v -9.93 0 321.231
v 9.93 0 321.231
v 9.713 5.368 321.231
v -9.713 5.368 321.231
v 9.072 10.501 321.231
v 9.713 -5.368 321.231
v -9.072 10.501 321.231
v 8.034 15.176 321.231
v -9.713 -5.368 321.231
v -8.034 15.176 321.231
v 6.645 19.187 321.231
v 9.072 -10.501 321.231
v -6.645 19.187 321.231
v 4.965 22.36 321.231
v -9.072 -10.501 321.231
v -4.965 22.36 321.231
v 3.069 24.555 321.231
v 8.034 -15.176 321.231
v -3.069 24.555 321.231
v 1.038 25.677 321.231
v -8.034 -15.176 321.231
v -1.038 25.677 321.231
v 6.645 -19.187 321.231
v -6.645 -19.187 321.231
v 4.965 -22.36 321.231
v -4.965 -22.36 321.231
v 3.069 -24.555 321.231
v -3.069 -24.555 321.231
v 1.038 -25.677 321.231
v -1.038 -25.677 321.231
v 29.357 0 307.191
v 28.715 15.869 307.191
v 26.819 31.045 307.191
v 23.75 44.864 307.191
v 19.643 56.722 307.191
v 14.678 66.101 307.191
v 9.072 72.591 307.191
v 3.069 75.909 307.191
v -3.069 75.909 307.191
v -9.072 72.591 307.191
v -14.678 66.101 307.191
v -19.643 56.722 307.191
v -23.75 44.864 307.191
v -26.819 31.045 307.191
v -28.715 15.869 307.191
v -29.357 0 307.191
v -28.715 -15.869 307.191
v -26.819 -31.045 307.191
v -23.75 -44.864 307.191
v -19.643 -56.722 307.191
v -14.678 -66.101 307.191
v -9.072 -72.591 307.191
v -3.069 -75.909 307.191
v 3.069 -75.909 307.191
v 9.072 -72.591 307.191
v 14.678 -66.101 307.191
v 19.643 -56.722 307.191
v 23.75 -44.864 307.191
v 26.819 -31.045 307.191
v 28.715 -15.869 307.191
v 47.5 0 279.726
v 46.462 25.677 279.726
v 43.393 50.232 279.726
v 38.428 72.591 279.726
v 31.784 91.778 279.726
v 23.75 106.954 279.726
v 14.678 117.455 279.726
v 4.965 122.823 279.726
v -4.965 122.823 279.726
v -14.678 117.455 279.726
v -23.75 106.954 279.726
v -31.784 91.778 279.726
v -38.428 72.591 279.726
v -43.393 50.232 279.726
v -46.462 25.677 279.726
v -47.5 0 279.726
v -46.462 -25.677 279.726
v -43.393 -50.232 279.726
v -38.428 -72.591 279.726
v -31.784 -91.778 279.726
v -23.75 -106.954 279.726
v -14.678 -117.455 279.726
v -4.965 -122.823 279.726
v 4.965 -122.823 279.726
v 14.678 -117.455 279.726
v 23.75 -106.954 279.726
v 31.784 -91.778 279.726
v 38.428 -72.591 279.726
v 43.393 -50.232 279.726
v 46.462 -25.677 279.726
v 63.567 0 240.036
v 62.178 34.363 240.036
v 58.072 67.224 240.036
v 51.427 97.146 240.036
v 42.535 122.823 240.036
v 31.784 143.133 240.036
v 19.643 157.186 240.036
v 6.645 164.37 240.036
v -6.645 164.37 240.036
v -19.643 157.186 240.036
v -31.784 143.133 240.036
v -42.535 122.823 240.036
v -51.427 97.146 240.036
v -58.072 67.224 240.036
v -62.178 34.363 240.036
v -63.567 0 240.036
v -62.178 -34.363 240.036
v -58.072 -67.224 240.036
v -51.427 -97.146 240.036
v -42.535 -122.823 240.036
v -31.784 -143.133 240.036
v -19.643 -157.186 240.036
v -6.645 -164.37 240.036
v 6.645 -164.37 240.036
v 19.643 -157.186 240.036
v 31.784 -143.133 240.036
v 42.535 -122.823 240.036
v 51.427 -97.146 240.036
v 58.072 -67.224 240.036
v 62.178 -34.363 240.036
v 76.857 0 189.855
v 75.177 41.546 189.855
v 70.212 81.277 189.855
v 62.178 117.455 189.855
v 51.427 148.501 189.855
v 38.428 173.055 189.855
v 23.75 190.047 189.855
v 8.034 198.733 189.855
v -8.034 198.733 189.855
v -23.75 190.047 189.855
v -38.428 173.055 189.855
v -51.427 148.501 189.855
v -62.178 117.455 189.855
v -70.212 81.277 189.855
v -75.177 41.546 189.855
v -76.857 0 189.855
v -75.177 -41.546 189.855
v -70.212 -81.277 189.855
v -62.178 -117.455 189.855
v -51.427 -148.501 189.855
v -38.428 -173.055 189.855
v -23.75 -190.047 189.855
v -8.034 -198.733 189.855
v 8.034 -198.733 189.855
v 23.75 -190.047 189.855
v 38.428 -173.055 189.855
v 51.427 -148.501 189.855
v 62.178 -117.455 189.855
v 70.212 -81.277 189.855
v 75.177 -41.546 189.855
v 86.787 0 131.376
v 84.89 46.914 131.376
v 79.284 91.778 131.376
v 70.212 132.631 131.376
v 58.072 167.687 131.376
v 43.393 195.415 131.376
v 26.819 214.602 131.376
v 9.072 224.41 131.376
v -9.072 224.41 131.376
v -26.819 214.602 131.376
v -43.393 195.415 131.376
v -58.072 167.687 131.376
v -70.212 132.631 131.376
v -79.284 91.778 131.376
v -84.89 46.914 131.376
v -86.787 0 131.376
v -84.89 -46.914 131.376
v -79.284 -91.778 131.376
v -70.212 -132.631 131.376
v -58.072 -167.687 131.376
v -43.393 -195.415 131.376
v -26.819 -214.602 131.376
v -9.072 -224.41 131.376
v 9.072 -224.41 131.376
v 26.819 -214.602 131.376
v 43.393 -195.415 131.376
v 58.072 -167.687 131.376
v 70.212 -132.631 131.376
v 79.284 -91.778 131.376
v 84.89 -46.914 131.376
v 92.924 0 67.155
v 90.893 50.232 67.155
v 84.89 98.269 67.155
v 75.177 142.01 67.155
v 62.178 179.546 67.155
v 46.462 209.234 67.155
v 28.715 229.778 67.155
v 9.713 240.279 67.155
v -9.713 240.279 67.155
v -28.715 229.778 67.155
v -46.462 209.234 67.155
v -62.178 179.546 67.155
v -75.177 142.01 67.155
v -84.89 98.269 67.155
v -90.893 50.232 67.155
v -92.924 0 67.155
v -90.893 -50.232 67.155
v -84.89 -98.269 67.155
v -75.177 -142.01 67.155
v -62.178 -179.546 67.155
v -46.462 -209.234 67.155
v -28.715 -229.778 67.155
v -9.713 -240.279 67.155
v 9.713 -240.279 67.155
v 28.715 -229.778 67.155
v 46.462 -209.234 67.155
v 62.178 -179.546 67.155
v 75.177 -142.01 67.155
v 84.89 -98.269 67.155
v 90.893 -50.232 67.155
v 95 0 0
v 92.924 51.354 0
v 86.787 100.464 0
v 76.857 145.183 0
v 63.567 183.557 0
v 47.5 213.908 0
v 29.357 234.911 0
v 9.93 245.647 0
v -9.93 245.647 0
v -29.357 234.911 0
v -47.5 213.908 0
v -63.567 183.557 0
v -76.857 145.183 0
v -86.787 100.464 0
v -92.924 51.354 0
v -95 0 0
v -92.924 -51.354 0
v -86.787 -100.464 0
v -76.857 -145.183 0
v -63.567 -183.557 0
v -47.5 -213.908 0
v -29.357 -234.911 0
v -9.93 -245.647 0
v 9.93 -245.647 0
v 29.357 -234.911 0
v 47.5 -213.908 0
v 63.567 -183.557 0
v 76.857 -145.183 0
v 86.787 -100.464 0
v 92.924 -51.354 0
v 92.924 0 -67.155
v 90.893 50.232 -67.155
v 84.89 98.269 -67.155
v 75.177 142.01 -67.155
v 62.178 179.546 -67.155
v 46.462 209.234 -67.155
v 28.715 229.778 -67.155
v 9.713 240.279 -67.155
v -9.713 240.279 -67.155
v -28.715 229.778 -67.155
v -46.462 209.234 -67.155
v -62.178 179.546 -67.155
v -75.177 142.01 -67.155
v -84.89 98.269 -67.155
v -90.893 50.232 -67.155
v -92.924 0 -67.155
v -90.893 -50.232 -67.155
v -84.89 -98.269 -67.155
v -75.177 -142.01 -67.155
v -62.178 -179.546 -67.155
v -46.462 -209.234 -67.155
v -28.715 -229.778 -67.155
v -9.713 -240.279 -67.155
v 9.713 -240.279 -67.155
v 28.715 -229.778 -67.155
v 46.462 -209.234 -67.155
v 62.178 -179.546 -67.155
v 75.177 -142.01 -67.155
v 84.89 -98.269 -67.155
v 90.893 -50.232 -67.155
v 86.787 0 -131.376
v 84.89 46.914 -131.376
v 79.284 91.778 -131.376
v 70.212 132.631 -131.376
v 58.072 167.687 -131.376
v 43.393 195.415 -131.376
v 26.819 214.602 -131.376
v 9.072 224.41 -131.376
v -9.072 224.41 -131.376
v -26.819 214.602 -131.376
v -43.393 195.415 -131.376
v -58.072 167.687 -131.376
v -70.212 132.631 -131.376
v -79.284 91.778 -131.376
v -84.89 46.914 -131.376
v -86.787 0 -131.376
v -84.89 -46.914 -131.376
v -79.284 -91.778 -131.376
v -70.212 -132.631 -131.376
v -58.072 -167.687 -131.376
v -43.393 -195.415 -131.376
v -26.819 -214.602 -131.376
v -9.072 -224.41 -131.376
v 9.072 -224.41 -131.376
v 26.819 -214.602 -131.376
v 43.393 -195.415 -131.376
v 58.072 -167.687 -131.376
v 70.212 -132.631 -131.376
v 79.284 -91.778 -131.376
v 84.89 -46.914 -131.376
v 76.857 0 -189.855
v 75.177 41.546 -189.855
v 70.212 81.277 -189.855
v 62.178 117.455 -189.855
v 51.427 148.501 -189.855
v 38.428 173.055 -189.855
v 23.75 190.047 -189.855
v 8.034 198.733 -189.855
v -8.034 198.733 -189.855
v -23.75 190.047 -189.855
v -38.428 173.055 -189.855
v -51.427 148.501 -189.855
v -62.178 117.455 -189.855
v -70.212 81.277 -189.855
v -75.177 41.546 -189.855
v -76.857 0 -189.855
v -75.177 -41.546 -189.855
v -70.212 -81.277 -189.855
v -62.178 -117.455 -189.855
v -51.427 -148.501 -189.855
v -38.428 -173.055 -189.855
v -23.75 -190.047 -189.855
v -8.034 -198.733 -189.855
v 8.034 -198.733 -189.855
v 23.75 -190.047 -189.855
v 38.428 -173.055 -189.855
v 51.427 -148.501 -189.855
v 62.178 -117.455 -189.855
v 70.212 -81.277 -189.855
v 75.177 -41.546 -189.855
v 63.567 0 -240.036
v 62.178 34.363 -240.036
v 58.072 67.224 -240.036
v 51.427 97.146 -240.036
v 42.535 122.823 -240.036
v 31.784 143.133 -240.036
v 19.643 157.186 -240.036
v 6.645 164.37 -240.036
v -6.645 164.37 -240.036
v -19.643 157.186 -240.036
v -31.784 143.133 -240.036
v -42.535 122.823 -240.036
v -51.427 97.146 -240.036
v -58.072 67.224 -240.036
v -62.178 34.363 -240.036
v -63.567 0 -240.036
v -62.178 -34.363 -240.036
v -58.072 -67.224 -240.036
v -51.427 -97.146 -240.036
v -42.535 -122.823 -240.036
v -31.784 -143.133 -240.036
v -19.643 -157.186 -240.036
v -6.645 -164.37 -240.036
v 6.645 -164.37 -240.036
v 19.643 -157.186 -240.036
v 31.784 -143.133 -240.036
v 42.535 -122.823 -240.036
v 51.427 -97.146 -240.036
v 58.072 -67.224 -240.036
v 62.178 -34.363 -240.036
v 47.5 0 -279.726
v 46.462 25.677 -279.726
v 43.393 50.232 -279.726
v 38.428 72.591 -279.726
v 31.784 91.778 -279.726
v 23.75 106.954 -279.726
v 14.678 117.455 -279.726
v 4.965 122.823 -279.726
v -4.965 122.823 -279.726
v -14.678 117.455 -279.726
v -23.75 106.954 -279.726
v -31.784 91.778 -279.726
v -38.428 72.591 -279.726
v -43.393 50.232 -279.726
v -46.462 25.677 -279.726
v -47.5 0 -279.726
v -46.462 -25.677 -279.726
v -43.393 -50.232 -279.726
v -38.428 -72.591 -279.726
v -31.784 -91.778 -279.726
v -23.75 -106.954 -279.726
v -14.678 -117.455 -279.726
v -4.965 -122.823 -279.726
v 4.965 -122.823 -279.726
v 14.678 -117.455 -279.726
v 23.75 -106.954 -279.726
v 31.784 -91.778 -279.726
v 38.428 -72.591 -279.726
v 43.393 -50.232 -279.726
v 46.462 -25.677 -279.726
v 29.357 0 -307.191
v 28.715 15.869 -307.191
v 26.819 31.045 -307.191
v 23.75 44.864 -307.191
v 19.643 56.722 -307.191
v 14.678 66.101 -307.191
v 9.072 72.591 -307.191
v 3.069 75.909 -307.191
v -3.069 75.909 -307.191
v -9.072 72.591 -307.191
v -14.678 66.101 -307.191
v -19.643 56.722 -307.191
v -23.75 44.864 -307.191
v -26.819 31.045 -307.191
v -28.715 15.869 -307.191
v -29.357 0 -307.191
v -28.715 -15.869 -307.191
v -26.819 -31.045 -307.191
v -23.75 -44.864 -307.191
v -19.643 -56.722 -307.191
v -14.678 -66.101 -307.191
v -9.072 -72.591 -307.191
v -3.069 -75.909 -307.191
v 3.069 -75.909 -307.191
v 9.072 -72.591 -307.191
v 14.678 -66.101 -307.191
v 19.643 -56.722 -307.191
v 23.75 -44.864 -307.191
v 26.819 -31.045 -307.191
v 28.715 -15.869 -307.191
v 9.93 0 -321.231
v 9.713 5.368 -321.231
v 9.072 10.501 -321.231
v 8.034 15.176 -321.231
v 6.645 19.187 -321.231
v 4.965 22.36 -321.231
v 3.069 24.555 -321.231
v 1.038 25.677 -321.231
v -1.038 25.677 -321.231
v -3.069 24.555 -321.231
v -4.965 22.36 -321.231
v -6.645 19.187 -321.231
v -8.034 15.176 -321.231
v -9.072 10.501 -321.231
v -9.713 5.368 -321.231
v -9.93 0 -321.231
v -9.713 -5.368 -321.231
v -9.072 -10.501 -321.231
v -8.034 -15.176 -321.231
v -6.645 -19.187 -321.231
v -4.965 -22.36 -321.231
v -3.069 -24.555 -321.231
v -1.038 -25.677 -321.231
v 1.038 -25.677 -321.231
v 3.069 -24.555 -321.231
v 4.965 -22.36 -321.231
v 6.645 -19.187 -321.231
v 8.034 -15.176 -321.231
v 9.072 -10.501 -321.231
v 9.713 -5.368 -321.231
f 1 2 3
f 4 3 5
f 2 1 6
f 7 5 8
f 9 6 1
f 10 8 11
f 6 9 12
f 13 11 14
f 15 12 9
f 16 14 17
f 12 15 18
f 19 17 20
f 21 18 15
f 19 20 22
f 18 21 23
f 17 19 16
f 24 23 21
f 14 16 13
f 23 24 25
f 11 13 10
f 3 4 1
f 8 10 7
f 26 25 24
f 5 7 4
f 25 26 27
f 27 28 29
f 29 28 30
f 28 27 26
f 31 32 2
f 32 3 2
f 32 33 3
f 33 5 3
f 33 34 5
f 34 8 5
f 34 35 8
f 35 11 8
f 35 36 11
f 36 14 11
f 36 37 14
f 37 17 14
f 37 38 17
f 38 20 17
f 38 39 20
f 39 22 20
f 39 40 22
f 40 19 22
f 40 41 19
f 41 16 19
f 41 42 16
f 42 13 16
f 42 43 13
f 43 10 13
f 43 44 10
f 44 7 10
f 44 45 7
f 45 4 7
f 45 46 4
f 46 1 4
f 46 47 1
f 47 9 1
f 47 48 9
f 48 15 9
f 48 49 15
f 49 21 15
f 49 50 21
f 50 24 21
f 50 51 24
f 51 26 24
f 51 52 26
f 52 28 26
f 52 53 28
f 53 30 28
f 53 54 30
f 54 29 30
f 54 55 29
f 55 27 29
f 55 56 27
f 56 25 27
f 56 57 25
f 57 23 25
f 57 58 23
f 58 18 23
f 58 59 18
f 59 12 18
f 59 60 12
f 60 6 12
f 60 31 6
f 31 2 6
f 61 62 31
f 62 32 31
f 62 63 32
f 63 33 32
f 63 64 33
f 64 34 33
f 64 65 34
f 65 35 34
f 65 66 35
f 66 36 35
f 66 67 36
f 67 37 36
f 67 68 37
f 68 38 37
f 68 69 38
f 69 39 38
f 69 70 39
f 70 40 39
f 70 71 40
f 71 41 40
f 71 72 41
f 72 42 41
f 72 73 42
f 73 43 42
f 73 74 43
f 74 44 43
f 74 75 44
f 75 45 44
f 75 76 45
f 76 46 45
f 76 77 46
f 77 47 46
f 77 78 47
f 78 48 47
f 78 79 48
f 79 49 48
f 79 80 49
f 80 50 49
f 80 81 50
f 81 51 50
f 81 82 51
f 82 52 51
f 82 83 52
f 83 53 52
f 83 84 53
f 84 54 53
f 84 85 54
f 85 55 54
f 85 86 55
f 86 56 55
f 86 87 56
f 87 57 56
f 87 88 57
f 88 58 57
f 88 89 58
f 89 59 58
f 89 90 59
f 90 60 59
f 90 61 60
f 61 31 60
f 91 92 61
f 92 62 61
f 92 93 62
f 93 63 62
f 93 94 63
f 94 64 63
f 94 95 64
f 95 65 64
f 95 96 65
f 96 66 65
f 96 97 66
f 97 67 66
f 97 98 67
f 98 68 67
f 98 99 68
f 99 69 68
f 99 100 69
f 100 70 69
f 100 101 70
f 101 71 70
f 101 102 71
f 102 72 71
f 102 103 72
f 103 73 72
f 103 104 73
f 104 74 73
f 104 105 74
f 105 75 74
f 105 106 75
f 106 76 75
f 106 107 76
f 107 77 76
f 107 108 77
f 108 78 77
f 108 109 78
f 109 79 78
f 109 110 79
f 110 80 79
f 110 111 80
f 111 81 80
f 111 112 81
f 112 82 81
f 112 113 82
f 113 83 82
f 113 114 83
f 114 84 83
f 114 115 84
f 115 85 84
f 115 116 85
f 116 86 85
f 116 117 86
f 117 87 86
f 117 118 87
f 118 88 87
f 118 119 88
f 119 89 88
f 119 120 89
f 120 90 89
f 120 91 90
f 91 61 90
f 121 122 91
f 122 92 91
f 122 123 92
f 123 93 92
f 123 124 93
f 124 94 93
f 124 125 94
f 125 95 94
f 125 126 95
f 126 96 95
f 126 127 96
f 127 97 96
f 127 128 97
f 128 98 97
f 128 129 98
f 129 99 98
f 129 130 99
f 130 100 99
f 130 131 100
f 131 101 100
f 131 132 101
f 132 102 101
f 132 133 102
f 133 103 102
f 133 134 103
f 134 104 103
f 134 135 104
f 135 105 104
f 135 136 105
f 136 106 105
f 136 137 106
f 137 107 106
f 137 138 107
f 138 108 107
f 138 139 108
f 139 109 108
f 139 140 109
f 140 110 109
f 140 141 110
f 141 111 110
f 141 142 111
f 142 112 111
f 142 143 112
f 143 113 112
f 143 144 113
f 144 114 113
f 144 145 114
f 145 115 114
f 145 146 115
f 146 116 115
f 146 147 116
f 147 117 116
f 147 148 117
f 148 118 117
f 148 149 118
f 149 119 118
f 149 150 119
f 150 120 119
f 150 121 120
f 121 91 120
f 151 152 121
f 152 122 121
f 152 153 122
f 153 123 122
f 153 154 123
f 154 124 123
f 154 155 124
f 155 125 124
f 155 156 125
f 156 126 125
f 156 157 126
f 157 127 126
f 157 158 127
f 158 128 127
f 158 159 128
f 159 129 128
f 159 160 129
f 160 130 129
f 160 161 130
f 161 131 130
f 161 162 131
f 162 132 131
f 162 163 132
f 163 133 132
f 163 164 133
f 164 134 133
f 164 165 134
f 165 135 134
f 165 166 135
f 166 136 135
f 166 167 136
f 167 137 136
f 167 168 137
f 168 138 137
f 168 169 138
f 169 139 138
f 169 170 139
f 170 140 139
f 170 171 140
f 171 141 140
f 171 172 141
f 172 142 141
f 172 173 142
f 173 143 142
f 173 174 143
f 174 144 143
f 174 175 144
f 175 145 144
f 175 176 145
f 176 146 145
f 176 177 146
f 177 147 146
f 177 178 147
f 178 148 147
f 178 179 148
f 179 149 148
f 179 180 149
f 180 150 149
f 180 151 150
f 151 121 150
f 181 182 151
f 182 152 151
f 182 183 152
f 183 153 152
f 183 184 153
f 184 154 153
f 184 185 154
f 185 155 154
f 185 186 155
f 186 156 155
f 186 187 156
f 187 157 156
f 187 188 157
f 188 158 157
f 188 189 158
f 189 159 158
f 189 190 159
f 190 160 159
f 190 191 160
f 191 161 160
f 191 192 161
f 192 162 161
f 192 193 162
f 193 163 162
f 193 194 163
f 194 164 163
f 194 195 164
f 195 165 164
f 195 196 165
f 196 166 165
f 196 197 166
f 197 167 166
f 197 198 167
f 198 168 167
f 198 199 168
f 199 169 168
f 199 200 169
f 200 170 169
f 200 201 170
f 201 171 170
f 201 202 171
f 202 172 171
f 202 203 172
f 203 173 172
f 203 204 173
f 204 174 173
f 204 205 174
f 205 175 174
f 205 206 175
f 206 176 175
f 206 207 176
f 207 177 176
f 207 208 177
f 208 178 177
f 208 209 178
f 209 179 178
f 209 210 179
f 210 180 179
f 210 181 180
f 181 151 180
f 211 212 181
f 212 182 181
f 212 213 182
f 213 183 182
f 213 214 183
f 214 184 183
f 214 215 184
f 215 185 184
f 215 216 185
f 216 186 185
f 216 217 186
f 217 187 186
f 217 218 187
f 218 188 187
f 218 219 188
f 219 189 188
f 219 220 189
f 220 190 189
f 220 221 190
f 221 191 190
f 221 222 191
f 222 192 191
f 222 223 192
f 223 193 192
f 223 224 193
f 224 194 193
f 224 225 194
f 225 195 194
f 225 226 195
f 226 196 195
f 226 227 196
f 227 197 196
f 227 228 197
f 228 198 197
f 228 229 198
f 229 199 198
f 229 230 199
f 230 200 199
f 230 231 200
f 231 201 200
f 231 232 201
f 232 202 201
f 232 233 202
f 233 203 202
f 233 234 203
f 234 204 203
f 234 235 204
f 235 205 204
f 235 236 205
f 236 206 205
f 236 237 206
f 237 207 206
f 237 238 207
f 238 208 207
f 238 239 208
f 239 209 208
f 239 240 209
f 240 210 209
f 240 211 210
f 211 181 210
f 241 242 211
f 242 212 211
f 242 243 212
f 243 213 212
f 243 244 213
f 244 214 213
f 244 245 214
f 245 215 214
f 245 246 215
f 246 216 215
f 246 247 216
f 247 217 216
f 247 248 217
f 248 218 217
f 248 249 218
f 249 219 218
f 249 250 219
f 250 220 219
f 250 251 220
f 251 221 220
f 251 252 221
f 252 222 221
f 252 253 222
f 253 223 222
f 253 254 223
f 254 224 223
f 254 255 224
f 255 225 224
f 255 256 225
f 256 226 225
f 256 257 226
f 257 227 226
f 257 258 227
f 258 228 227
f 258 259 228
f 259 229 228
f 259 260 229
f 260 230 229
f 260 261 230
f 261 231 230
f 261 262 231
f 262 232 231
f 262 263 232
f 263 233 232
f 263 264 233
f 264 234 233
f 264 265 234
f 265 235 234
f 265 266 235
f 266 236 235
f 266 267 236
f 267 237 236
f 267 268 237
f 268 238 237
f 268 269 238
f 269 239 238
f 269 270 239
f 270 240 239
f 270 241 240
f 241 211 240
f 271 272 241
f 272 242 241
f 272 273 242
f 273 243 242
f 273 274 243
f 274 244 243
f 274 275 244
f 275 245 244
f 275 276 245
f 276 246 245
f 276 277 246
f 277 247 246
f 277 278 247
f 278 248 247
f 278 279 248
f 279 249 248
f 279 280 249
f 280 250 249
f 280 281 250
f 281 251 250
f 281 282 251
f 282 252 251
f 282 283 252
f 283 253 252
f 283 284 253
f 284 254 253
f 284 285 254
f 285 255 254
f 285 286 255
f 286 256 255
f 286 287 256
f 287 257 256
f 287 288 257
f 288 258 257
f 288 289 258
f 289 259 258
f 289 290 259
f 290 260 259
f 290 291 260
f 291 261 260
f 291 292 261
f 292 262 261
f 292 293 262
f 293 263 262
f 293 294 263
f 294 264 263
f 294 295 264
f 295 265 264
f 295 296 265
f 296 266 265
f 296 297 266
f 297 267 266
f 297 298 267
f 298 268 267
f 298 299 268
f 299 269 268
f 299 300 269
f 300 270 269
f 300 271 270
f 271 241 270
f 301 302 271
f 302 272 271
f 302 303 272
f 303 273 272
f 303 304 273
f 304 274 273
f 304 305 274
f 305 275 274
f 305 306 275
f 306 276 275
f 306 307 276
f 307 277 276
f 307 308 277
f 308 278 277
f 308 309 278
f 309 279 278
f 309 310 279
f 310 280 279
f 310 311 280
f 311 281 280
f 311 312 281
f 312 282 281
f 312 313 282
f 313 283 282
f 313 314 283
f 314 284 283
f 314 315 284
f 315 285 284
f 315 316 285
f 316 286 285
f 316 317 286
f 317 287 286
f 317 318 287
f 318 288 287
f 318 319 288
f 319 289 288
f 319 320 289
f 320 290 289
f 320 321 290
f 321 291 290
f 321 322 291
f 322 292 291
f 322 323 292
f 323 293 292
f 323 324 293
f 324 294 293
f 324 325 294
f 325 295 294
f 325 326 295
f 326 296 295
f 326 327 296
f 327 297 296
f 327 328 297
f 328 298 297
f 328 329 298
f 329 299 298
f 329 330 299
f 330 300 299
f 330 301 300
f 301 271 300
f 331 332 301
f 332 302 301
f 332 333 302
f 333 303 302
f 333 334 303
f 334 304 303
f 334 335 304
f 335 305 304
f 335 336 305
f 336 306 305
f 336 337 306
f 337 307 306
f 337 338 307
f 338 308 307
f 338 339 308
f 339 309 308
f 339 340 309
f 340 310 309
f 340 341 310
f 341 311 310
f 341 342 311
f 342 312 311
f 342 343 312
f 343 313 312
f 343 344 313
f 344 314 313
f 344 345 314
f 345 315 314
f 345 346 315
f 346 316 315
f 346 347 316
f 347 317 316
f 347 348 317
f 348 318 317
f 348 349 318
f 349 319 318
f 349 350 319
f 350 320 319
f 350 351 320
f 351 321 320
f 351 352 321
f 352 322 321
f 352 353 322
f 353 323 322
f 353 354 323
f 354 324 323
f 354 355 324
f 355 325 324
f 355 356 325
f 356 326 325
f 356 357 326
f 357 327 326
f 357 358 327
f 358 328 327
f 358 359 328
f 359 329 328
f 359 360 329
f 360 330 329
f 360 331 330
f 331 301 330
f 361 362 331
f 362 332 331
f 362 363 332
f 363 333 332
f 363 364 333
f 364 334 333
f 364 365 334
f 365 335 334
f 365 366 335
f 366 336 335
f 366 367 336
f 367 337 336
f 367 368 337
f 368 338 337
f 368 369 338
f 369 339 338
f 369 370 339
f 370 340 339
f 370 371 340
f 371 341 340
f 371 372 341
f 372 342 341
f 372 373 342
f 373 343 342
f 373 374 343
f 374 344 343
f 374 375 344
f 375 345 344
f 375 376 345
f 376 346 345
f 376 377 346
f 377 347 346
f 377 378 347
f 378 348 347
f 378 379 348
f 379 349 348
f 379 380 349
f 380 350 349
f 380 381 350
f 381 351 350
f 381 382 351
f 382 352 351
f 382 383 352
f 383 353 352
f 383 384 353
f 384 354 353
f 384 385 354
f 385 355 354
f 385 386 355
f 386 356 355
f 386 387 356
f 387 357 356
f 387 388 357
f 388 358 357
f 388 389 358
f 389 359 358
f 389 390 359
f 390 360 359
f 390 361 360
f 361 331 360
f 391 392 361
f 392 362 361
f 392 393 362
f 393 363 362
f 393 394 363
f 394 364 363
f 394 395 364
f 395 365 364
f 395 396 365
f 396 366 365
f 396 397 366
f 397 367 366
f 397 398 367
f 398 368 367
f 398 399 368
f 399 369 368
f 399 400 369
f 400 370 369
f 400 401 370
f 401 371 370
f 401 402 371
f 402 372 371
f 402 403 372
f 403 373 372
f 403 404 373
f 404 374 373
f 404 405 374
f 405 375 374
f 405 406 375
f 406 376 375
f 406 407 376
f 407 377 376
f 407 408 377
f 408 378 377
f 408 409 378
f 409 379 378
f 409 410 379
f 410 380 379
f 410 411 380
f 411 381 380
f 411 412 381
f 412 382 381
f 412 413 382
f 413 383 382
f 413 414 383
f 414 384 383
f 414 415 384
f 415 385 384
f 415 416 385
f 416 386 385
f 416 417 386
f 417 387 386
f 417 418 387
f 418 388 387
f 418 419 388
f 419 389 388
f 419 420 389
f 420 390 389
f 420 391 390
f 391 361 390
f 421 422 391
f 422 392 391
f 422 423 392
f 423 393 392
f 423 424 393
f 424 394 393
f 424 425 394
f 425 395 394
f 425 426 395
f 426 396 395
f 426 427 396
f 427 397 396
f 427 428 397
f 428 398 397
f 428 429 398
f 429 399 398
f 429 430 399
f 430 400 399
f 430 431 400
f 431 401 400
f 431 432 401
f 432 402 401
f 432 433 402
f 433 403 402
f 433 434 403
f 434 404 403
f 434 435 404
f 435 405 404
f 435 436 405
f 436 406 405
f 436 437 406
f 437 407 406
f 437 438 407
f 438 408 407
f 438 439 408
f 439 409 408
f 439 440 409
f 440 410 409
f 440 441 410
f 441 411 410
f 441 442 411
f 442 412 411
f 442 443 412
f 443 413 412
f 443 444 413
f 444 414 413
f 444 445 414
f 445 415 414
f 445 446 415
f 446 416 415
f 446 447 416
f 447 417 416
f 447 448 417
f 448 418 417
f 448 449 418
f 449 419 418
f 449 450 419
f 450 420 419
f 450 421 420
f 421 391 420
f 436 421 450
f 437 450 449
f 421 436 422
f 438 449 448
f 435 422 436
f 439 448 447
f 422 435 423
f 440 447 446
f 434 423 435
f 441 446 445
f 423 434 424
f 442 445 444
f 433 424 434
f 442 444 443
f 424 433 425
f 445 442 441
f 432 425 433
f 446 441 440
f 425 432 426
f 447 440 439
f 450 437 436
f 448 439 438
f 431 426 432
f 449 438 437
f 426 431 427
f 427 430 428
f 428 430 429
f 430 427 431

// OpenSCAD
// Generated by SolidPython 1.0.1 on 2020-07-29 00:39:26


scale(v = [5, 13, 17]) {
	sphere(r = 19);
}
/***********************************************
*********      SolidPython code:      **********
************************************************
 
# import packages: SolidPython
from solid import *
from solid.utils import *
from itertools import chain, combinations


class Resize:

    def __init__(self, scad_file):
        self.scad_file = scad_file
        #self.scad_file = import_scad(scad_file)
        # cone/cylinder param:
        self.r1 = 0
        self.r2 = 0
        self.h = 0
        # rectangular prism param:
        self.w = 0
        self.l = 0
        # ellipse param:
        self.r = 0

    # import OpenScad code (file name corresponds to shape)


    # classify shape + parameters
    def assign(self, param1, param2, param3):
        if self.scad_file == 'cone.scad':
            self.r1 = param1
            self.r2 = param2
            self.h = param3
        elif self.scad_file == 'cylinder.scad':
            self.r1 = param1
            self.r2 = param2
            self.h = param3
        elif self.scad_file == 'rectangularPrism.scad':
            self.h = param1
            self.l = param2
            self.w = param3
        else:
            self.r = param1
            self.h = param2

    # resize parameters
    def iterate(self):
        x = range(3, 20, 2)
        i = 1
        if self.scad_file == 'cone.scad':
            tempList = list(combinations(x, 2))
            for temp in tempList:
                param1 = temp[0]
                param2 = temp[1]
                filepath = 'produced_scad_files/' + 'cone' + str(param1) + '_' + str(param2) + '_' + '.scad'
                scad_render_to_file(cylinder(h=param1, r1=param2, r2=0), filepath)

        elif self.scad_file == 'cylinder.scad':
            tempList = list(combinations(x, 3))
            for temp in tempList:
                param1 = temp[0]
                param2 = temp[1]
                filepath = 'produced_scad_files/' + 'cylinder' + str(param1) + '_' + str(param2) + '_' + '.scad'
                scad_render_to_file(cylinder(h=param1, r1=param2, r2=param2), filepath)

        elif self.scad_file == 'rectangularPrism.scad':
            tempList = list(combinations(x, 3))
            for temp in tempList:
                param1 = temp[0]
                param2 = temp[1]
                param3 = temp[2]
                filepath = 'produced_scad_files/' + 'rectangularPrism' + str(param1) + '_' + str(param2) + '_' + str(
                    param3) + '.scad'
                scad_render_to_file(cube(size=(param1, param2, param3)), filepath)

        elif self.scad_file == 'ellipse.scad':
            tempList = list(combinations(x, 4))
            for temp in tempList:
                param1 = temp[0]
                param2 = temp[1]
                param3 = temp[2]
                param4 = temp[3]
                filepath = 'produced_scad_files/' + 'ellipse' + str(param1) + '_' + str(param2) + '_' + str(param3) + '_' + str(param4) + '.scad'
                scad_render_to_file(scale([param1, param2, param3])(sphere(r=param4)), filepath)

    def render_to_scadfile(self):
        scad_render_to_file(scad, 'example.scad') 
 
************************************************/
